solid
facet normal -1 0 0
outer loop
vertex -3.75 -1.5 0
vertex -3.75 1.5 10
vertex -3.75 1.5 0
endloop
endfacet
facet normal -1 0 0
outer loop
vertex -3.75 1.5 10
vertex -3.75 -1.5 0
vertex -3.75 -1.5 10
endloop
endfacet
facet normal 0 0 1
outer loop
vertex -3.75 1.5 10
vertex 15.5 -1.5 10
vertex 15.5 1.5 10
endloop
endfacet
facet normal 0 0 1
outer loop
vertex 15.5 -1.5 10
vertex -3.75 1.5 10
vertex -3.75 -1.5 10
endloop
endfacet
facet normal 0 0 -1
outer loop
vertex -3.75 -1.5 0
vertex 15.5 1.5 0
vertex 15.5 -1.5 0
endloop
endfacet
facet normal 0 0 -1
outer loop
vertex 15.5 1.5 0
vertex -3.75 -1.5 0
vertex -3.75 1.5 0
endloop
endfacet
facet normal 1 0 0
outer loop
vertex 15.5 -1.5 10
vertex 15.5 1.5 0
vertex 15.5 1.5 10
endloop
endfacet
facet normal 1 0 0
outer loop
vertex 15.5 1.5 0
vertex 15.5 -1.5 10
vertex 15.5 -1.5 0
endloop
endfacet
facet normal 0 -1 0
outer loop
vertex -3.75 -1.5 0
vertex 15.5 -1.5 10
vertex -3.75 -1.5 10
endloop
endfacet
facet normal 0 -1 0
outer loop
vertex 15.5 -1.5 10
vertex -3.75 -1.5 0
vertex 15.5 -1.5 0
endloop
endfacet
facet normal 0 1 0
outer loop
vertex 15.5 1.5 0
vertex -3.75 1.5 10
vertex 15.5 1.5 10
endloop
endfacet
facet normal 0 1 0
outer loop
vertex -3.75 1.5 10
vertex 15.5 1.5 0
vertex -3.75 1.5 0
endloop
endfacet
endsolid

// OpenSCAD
// Built by bench/smallmodels/features/compiler.py from a list of features.
$fn = 64;
difference() {
  union() {
    translate([0, 0, 0]) linear_extrude(height = 10) polygon([[-9.35, -1.5], [18.7, -1.5], [18.7, 1.5], [-9.35, 1.5]]);
  }
  union() {
    translate([-8.75, 0, 0]) rotate([0, 0, 0]) translate([-5, -5, 0]) cube([10, 10, 10]);
    translate([20.5, -2.25, 0]) rotate([0, 0, 0]) translate([-5, -5, 0]) cube([10, 10, 10]);
  }
}
